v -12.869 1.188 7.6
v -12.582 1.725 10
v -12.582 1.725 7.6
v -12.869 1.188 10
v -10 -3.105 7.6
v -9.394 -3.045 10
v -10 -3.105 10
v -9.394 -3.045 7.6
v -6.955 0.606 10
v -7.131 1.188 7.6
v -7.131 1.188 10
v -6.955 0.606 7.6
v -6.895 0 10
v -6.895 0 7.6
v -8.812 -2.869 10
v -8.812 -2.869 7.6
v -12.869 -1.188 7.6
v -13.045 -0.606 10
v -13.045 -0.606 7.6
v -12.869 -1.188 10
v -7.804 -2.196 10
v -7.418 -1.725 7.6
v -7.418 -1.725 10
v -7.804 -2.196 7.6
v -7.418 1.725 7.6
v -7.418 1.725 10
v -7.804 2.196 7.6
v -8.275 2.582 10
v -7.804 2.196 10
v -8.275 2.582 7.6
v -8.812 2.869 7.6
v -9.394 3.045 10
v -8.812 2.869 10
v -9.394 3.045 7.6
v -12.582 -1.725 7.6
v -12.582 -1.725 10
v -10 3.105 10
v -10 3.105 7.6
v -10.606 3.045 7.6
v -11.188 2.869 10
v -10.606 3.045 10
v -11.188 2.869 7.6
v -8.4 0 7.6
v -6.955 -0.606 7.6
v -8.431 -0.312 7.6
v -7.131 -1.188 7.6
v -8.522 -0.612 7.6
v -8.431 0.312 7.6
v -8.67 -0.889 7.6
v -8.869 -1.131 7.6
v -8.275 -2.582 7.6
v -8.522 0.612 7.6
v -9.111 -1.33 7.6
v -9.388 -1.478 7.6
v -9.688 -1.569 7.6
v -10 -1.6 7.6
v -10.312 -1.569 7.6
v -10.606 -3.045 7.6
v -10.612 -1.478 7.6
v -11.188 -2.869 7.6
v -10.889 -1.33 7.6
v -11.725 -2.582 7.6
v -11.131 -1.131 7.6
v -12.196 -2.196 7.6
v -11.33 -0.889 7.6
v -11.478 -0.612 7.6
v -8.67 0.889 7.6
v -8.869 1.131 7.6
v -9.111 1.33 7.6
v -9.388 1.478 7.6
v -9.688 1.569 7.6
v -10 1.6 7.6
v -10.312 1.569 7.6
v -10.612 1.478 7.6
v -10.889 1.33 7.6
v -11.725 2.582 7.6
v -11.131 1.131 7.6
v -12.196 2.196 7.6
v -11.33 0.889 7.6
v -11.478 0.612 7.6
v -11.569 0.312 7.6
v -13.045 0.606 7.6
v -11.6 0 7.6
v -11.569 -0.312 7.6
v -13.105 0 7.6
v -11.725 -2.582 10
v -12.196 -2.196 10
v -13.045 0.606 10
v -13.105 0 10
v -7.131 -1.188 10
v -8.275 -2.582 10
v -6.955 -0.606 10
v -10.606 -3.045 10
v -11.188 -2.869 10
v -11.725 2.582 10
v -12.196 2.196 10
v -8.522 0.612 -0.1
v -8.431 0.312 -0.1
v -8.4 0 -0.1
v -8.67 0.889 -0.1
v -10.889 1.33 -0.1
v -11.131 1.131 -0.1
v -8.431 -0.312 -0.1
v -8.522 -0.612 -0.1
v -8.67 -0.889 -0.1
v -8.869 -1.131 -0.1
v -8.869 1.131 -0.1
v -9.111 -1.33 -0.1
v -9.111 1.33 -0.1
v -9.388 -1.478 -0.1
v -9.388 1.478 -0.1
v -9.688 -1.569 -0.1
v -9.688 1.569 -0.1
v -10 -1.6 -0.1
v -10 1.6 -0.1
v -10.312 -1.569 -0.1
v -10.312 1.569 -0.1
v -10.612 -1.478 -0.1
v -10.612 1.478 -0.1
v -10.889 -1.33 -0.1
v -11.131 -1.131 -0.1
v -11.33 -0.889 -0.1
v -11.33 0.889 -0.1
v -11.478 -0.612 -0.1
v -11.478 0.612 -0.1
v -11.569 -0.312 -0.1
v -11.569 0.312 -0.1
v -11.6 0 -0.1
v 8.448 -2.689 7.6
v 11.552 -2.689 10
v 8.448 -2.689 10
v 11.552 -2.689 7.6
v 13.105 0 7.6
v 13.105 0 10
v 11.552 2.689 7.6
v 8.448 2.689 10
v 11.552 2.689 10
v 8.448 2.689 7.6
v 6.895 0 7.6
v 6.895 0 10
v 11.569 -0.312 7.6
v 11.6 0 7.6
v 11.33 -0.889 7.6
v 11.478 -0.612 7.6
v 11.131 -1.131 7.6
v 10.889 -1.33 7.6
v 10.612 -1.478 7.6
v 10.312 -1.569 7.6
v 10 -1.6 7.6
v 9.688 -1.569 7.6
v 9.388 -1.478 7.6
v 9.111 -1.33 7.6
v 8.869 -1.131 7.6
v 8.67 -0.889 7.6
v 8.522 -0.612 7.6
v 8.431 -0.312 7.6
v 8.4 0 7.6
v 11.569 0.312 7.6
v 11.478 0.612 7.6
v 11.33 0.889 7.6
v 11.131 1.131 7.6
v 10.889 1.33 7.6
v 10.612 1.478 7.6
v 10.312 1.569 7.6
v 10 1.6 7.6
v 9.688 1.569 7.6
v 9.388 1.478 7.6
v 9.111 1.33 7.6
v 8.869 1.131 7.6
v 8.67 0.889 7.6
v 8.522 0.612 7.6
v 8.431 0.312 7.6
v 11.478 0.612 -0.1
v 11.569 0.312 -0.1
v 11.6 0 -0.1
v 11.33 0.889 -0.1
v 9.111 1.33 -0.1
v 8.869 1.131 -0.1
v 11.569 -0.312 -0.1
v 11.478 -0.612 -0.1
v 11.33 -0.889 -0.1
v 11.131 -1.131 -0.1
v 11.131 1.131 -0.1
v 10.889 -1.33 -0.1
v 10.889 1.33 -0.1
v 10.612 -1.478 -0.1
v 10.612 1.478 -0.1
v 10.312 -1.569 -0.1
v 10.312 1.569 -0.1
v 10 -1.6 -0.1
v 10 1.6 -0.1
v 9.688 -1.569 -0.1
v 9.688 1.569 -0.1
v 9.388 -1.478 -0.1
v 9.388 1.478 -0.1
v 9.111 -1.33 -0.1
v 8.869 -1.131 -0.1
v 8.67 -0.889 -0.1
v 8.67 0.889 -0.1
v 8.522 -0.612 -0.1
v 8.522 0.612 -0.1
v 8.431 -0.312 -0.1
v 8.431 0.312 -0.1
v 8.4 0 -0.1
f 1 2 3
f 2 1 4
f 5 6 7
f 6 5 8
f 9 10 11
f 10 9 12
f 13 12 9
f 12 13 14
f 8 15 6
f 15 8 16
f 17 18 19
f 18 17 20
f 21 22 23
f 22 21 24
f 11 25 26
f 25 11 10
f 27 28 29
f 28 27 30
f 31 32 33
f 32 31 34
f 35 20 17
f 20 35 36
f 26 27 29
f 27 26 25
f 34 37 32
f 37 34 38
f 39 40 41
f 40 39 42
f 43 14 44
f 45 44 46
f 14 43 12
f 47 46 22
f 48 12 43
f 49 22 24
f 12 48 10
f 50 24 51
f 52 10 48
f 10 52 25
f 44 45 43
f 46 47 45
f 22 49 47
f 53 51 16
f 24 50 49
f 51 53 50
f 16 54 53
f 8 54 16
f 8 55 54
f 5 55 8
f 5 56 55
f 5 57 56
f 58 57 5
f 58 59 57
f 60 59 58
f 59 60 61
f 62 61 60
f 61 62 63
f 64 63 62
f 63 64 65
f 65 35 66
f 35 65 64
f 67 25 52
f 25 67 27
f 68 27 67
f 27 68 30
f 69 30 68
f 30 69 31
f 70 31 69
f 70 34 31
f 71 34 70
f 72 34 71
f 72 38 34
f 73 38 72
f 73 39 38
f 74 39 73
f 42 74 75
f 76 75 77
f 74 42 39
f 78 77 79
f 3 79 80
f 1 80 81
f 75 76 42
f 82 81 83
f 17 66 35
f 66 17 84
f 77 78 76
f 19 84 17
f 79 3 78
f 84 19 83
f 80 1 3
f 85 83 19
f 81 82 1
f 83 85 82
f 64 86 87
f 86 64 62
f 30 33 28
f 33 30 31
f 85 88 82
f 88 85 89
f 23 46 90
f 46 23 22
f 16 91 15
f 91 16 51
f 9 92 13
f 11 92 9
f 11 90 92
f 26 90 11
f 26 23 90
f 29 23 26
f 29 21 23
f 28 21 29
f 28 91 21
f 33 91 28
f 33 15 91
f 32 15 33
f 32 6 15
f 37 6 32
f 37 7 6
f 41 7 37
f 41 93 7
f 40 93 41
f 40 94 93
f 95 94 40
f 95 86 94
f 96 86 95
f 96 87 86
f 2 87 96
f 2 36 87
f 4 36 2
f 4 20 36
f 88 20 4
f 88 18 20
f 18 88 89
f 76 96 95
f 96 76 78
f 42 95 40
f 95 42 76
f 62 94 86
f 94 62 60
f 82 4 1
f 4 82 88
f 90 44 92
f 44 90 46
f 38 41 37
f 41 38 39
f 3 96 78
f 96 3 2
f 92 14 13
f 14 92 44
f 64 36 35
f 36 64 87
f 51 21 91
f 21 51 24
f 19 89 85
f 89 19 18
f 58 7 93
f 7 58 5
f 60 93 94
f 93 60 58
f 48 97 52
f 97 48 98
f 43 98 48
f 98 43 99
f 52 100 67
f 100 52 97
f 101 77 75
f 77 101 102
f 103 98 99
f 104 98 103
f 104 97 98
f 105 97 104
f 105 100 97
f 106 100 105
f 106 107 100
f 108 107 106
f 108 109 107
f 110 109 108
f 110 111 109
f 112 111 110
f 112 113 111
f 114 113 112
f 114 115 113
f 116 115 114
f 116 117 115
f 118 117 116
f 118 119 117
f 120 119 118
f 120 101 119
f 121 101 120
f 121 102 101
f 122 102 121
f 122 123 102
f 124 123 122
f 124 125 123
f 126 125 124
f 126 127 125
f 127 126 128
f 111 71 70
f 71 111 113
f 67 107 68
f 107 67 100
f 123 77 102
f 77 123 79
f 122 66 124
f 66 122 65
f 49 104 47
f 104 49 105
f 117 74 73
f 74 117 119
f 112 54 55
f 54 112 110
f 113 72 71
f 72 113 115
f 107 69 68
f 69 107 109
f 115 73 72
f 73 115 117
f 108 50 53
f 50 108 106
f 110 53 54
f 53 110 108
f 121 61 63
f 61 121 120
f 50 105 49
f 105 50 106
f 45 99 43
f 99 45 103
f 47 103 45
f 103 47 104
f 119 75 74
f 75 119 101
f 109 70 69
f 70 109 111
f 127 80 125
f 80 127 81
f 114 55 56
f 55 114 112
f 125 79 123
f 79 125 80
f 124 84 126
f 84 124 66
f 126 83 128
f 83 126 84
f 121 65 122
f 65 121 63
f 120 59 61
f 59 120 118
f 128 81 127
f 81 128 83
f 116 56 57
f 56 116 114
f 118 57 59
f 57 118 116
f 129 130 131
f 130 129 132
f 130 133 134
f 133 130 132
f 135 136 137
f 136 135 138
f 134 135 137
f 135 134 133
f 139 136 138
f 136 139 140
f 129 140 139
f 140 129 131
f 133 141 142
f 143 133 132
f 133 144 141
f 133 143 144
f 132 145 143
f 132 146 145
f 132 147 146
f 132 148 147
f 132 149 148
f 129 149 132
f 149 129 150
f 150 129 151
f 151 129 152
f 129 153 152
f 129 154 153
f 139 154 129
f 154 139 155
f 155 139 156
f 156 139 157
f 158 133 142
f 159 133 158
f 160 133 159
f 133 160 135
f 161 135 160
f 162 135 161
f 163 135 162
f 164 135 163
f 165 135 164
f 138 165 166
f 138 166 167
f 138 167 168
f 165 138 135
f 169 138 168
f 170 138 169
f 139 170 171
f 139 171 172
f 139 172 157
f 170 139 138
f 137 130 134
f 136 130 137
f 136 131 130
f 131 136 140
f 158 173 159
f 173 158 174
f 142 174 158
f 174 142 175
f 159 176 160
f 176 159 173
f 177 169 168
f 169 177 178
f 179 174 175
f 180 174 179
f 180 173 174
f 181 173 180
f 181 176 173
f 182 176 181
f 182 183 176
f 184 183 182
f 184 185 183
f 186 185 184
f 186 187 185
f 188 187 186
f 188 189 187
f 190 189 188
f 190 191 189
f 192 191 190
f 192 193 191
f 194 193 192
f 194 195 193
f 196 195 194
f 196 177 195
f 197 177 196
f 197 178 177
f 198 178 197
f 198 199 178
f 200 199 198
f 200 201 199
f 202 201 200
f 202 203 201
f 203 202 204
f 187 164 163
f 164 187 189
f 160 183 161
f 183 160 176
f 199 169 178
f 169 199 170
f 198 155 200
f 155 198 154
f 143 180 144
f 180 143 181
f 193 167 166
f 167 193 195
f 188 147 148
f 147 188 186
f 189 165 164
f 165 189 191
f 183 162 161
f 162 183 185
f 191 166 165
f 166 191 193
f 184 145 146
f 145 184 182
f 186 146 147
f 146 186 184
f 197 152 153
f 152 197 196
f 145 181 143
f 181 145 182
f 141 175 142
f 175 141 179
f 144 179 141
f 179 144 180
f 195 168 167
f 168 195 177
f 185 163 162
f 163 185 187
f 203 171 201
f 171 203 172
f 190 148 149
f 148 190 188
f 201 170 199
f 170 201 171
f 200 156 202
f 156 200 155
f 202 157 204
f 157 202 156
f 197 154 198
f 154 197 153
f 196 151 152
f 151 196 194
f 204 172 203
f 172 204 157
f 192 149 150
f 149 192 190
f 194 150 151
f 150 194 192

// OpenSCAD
DIN_TOLERANCE = 0.1;

module din_help(name, _STD_TABLE) {
    echo("-----------------------------");
    echo(str("Size indexes for ", name));
    for(idx=[0:len(_STD_TABLE)-1]) {
        echo(str(idx, " = M", _STD_TABLE[idx][0]));
    }
    echo("-----------------------------");
}

module din_cutout_base(inner, outer, cap_height, height, fn) {
    translate([0, 0, height]) {
        mirror([0, 0, 1]) {
            cylinder(r=outer/2 + DIN_TOLERANCE, h=cap_height, center=false, $fn = fn);
            cylinder(r=inner/2 + DIN_TOLERANCE, h=height + 0.1, center=false, $fn = 32);
        }
    }
}

module hex_nut(inner, outer, cap_height, height = 0) {
    din_cutout_base(inner, outer, cap_height, height, 6);
}

module round_bolt(inner, outer, cap_height, height = 0) {
    din_cutout_base(inner, outer, cap_height, height, 32);
}

translate([-10, 0, 0]) round_bolt(inner = 3, outer = 6.01, cap_height = 2.4, height = 10);
translate([10, 0, 0]) hex_nut(inner = 3, outer = 6.01, cap_height = 2.4, height = 10);
